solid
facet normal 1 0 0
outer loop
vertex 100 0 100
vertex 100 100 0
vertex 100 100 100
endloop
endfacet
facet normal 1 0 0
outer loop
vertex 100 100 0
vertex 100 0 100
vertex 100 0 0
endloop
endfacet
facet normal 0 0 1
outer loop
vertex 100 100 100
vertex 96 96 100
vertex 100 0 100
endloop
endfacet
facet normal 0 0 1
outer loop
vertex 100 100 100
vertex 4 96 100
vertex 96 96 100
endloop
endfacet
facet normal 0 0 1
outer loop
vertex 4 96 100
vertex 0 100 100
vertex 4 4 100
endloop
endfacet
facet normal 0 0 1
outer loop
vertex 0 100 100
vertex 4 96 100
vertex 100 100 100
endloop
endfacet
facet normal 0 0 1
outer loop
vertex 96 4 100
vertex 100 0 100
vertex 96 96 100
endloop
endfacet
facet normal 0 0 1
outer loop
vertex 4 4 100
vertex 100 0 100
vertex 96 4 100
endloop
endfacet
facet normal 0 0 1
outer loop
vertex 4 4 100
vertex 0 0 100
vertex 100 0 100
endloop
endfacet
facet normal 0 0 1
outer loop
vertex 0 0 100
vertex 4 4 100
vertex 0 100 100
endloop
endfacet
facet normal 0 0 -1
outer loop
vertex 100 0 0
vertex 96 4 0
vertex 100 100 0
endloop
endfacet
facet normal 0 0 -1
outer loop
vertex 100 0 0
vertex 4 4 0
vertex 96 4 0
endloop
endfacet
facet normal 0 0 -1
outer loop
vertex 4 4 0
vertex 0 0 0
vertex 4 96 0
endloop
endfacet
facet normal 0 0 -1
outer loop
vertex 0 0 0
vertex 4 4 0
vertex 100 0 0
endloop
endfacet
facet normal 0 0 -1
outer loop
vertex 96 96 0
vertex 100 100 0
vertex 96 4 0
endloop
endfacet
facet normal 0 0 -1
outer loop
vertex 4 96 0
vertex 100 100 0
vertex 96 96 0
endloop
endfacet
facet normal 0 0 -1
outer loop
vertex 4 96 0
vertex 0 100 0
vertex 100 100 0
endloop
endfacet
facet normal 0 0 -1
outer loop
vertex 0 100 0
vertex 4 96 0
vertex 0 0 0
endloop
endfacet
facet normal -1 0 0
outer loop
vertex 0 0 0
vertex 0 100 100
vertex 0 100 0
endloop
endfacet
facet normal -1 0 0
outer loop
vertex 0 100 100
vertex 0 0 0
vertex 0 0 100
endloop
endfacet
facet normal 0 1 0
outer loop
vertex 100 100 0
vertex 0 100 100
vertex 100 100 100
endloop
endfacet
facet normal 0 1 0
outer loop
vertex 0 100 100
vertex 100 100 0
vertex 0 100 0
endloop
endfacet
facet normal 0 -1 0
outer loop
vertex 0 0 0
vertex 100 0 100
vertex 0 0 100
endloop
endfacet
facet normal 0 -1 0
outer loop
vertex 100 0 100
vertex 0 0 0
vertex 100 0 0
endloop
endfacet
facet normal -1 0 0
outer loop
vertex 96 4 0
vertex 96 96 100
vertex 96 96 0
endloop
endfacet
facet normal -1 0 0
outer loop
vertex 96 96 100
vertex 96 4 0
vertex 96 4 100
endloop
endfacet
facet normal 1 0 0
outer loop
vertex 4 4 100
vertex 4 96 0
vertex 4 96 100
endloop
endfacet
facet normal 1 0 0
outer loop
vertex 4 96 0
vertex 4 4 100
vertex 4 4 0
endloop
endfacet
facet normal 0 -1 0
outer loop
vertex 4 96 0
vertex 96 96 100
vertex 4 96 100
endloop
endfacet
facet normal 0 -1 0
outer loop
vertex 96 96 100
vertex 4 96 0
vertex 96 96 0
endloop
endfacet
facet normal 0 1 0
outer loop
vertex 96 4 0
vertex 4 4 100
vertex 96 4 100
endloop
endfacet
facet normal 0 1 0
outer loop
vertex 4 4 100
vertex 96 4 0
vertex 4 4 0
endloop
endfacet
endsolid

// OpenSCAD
// 100 mm x 100 mm x 100 mm hollow square ring with 4 mm walls.
// Open at the top and bottom.

outer_size = 100;
height = 100;
wall = 4;

difference() {
    cube([outer_size, outer_size, height], center = false);

    translate([wall, wall, -1])
        cube([
            outer_size - 2 * wall,
            outer_size - 2 * wall,
            height + 2
        ], center = false);
}
